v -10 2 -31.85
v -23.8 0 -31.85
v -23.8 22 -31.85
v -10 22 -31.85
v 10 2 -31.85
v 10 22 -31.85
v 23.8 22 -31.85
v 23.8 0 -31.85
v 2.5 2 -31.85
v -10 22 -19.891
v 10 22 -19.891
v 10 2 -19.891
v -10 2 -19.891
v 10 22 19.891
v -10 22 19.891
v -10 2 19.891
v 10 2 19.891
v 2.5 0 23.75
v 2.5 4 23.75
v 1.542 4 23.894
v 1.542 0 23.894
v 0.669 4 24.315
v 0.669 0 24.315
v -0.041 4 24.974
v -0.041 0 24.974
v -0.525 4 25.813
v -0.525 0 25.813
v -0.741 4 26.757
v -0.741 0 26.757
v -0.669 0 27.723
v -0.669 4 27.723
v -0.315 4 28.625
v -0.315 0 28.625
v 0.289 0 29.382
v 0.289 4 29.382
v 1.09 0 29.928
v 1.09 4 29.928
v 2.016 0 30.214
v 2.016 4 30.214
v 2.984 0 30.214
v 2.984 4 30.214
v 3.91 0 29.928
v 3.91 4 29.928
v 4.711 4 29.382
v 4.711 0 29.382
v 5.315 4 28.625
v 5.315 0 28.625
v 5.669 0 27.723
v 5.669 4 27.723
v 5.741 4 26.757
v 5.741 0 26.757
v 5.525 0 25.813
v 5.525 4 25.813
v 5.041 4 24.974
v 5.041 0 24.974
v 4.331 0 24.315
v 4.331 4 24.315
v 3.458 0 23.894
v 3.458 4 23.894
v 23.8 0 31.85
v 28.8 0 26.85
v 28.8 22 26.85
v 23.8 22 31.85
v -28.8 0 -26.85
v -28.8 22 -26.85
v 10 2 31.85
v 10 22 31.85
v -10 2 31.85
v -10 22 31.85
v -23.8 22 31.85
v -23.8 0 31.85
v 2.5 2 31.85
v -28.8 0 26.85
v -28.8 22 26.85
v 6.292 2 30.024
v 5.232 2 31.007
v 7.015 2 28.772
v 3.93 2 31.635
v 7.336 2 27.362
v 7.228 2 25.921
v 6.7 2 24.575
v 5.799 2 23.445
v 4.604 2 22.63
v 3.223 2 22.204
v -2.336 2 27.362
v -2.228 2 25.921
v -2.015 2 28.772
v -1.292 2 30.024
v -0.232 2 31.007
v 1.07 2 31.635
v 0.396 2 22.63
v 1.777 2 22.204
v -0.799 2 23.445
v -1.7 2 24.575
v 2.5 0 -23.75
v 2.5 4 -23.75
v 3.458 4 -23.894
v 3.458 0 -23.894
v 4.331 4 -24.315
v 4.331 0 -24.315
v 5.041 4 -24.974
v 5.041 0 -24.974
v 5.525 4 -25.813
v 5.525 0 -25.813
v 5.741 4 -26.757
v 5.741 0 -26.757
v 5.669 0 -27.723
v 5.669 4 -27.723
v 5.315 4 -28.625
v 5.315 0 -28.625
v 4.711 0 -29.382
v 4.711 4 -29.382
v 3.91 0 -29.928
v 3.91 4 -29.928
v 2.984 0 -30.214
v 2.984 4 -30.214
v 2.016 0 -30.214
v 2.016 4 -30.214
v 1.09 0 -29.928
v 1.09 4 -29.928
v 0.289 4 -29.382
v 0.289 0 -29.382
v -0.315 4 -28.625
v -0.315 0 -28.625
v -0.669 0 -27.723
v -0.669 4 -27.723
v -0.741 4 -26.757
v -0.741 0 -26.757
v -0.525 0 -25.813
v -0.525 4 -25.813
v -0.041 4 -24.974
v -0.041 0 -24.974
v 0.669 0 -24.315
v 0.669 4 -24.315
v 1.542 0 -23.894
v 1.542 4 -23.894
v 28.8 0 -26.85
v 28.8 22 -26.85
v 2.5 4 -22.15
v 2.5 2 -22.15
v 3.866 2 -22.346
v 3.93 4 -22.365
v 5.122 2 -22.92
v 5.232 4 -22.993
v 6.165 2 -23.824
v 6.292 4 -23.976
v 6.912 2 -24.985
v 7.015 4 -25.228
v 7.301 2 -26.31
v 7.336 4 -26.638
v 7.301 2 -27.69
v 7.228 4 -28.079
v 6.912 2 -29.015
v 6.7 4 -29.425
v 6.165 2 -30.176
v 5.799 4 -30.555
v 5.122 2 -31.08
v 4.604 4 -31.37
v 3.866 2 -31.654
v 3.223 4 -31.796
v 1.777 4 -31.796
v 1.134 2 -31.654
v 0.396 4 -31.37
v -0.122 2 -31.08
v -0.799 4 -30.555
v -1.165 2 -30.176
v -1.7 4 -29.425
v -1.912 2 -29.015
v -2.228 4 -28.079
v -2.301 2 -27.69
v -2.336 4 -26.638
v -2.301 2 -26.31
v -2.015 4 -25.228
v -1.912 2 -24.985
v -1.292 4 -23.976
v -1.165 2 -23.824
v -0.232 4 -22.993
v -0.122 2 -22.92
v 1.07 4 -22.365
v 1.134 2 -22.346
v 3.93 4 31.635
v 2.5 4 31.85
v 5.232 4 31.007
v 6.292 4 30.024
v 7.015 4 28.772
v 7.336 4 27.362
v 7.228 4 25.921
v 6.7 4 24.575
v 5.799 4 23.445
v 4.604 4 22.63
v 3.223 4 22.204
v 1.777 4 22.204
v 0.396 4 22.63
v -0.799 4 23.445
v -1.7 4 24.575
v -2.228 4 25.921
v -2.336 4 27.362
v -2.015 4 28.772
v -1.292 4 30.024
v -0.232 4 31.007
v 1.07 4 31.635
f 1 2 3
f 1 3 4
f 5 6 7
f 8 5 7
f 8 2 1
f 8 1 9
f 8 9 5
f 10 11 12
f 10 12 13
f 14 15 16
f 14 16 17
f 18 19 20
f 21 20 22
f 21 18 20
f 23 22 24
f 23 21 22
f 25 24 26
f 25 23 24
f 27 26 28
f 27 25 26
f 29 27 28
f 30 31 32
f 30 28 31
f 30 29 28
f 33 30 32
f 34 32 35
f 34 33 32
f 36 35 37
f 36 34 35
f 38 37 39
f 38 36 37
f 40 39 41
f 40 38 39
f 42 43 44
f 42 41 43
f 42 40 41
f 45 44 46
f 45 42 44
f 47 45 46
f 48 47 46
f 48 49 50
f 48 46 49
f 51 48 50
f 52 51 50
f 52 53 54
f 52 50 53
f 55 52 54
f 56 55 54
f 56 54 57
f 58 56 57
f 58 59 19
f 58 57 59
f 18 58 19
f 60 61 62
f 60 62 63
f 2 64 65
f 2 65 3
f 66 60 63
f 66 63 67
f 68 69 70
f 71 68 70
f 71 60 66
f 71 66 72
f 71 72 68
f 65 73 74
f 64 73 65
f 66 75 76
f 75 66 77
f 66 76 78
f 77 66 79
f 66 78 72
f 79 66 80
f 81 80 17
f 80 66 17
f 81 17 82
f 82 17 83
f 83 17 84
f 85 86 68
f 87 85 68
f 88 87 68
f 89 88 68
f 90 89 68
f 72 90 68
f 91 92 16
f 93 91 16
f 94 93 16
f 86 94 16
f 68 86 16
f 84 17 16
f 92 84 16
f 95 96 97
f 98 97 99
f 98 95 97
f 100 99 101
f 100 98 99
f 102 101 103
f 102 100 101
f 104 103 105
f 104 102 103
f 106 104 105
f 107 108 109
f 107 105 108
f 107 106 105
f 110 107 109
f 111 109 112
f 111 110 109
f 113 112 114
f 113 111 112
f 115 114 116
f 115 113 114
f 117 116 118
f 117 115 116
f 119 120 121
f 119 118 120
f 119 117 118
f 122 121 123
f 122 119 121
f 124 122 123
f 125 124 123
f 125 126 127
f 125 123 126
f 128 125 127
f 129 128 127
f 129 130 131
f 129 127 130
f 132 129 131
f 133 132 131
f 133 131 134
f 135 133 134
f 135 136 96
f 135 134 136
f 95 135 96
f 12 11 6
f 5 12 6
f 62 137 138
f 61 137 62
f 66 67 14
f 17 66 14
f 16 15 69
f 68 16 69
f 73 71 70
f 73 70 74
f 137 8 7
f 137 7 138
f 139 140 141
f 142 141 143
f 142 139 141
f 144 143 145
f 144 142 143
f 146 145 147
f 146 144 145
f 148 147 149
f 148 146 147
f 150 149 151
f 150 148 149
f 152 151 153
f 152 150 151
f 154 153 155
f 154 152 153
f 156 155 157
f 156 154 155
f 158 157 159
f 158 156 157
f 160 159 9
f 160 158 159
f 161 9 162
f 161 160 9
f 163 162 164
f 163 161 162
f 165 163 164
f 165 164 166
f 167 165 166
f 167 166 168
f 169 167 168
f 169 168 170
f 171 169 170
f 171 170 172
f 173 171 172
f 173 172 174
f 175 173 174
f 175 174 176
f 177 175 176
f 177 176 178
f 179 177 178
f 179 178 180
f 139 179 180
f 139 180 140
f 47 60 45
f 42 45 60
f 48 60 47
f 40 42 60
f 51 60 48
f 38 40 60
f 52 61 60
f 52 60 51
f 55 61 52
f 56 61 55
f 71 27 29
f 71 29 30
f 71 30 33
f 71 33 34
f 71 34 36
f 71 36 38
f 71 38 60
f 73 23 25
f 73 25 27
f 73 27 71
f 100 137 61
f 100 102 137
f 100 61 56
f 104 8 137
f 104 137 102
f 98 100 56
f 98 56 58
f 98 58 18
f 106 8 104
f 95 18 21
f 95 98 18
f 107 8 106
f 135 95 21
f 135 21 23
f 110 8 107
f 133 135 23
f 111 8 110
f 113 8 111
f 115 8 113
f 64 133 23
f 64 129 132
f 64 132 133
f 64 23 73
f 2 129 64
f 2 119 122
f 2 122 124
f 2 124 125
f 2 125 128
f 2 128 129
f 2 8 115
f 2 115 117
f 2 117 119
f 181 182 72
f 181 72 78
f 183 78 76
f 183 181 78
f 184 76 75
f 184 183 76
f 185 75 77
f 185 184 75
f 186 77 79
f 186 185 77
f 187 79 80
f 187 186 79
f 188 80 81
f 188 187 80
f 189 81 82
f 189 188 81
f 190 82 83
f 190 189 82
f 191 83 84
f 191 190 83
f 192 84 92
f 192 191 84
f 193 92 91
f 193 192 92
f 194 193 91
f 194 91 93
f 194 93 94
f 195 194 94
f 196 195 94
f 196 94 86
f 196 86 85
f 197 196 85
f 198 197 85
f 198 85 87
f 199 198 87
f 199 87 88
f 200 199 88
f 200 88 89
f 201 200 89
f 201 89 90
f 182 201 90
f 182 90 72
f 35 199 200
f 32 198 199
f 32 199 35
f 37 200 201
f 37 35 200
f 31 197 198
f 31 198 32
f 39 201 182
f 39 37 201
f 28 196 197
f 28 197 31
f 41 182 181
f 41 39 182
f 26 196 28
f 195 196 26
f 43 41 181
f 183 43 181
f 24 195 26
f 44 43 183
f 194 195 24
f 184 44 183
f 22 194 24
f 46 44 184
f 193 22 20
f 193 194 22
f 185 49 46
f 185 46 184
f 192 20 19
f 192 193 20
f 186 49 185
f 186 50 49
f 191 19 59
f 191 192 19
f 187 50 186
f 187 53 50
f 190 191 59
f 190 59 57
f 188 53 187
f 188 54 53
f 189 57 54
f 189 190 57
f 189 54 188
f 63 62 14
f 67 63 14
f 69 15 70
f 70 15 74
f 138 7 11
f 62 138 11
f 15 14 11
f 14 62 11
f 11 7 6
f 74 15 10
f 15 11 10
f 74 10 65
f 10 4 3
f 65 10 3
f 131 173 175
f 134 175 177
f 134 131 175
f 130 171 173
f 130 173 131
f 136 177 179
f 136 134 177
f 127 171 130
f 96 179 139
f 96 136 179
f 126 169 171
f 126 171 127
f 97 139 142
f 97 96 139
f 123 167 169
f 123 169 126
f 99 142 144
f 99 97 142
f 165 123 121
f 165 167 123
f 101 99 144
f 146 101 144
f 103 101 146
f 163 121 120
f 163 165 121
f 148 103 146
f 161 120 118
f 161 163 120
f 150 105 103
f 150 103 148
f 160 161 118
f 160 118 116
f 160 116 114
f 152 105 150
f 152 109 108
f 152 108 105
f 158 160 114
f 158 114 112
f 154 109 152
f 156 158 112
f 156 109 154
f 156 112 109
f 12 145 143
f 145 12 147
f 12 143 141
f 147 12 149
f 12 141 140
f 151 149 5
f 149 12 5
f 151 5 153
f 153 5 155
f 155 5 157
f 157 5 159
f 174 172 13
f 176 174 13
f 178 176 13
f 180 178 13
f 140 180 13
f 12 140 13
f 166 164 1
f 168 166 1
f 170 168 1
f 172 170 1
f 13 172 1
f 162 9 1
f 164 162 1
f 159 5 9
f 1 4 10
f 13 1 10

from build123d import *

# Parameters (mm, degrees)
SKETCH_1_R          = 3.25
EXTRUDE_1_DEPTH     = 22
SKETCH_2_R          = 4.85
CUT_EXTRUDE_3_DEPTH = 20
SKETCH_3_R          = 6
CUT_EXTRUDE_4_DEPTH = 18


with BuildPart() as part:
    # 草图1 → 凸台-拉伸1 (new body)
    with BuildSketch(Plane(origin=(0, 0, 0), x_dir=(1, 0, 0), z_dir=(0, 1, 0))):
        Polygon((-28.8, 26.85), (-23.8, 31.85), (23.8, 31.85), (28.8, 26.85), (28.8, -26.85), (23.8, -31.85), (-23.8, -31.85), (-28.8, -26.85), align=None)
        with Locations(Location((2.5, 27, 0), (0, 0, 270))):
            Circle(SKETCH_1_R, mode=Mode.SUBTRACT)
        with Locations(Location((2.5, -27, 0), (0, 0, 90))):
            Circle(SKETCH_1_R, mode=Mode.SUBTRACT)
    extrude(amount=EXTRUDE_1_DEPTH)

    # 草图2 → 切除-拉伸3 (cut)
    # profile 1 of 2: a face of its own
    with BuildSketch(Plane(origin=(0, 22, 0), x_dir=(1, 0, 0), z_dir=(0, 1, 0))):
        Polygon((-10, -19.891494973), (10, -19.891494973), (10, -31.85), (10, -34.308434643), (-10, -34.308434643), (-10, -31.85), align=None)
        with Locations(Location((2.5, -27, 0), (0, 0, 270))):
            Circle(SKETCH_2_R, mode=Mode.SUBTRACT)
    # profile 2 of 2: a face of its own
    with BuildSketch(Plane(origin=(0, 22, 0), x_dir=(1, 0, 0), z_dir=(0, 1, 0))):
        Polygon((-10, 19.891494973), (-10, 31.85), (-10, 34.247261474), (10, 34.247261474), (10, 31.85), (10, 19.891494973), align=None)
        with Locations(Location((2.5, 27, 0), (0, 0, 270))):
            Circle(SKETCH_2_R, mode=Mode.SUBTRACT)
    extrude(amount=-CUT_EXTRUDE_3_DEPTH, mode=Mode.SUBTRACT)

    # 草图3 → 切除-拉伸4 (cut)
    with BuildSketch(Plane(origin=(0, 22, 0), x_dir=(1, 0, 0), z_dir=(0, 1, 0))):
        with Locations((2.5, 27)):
            Circle(SKETCH_3_R)
        with Locations((2.5, -27)):
            Circle(SKETCH_3_R)
    extrude(amount=-CUT_EXTRUDE_4_DEPTH, mode=Mode.SUBTRACT)


solid = part.part
